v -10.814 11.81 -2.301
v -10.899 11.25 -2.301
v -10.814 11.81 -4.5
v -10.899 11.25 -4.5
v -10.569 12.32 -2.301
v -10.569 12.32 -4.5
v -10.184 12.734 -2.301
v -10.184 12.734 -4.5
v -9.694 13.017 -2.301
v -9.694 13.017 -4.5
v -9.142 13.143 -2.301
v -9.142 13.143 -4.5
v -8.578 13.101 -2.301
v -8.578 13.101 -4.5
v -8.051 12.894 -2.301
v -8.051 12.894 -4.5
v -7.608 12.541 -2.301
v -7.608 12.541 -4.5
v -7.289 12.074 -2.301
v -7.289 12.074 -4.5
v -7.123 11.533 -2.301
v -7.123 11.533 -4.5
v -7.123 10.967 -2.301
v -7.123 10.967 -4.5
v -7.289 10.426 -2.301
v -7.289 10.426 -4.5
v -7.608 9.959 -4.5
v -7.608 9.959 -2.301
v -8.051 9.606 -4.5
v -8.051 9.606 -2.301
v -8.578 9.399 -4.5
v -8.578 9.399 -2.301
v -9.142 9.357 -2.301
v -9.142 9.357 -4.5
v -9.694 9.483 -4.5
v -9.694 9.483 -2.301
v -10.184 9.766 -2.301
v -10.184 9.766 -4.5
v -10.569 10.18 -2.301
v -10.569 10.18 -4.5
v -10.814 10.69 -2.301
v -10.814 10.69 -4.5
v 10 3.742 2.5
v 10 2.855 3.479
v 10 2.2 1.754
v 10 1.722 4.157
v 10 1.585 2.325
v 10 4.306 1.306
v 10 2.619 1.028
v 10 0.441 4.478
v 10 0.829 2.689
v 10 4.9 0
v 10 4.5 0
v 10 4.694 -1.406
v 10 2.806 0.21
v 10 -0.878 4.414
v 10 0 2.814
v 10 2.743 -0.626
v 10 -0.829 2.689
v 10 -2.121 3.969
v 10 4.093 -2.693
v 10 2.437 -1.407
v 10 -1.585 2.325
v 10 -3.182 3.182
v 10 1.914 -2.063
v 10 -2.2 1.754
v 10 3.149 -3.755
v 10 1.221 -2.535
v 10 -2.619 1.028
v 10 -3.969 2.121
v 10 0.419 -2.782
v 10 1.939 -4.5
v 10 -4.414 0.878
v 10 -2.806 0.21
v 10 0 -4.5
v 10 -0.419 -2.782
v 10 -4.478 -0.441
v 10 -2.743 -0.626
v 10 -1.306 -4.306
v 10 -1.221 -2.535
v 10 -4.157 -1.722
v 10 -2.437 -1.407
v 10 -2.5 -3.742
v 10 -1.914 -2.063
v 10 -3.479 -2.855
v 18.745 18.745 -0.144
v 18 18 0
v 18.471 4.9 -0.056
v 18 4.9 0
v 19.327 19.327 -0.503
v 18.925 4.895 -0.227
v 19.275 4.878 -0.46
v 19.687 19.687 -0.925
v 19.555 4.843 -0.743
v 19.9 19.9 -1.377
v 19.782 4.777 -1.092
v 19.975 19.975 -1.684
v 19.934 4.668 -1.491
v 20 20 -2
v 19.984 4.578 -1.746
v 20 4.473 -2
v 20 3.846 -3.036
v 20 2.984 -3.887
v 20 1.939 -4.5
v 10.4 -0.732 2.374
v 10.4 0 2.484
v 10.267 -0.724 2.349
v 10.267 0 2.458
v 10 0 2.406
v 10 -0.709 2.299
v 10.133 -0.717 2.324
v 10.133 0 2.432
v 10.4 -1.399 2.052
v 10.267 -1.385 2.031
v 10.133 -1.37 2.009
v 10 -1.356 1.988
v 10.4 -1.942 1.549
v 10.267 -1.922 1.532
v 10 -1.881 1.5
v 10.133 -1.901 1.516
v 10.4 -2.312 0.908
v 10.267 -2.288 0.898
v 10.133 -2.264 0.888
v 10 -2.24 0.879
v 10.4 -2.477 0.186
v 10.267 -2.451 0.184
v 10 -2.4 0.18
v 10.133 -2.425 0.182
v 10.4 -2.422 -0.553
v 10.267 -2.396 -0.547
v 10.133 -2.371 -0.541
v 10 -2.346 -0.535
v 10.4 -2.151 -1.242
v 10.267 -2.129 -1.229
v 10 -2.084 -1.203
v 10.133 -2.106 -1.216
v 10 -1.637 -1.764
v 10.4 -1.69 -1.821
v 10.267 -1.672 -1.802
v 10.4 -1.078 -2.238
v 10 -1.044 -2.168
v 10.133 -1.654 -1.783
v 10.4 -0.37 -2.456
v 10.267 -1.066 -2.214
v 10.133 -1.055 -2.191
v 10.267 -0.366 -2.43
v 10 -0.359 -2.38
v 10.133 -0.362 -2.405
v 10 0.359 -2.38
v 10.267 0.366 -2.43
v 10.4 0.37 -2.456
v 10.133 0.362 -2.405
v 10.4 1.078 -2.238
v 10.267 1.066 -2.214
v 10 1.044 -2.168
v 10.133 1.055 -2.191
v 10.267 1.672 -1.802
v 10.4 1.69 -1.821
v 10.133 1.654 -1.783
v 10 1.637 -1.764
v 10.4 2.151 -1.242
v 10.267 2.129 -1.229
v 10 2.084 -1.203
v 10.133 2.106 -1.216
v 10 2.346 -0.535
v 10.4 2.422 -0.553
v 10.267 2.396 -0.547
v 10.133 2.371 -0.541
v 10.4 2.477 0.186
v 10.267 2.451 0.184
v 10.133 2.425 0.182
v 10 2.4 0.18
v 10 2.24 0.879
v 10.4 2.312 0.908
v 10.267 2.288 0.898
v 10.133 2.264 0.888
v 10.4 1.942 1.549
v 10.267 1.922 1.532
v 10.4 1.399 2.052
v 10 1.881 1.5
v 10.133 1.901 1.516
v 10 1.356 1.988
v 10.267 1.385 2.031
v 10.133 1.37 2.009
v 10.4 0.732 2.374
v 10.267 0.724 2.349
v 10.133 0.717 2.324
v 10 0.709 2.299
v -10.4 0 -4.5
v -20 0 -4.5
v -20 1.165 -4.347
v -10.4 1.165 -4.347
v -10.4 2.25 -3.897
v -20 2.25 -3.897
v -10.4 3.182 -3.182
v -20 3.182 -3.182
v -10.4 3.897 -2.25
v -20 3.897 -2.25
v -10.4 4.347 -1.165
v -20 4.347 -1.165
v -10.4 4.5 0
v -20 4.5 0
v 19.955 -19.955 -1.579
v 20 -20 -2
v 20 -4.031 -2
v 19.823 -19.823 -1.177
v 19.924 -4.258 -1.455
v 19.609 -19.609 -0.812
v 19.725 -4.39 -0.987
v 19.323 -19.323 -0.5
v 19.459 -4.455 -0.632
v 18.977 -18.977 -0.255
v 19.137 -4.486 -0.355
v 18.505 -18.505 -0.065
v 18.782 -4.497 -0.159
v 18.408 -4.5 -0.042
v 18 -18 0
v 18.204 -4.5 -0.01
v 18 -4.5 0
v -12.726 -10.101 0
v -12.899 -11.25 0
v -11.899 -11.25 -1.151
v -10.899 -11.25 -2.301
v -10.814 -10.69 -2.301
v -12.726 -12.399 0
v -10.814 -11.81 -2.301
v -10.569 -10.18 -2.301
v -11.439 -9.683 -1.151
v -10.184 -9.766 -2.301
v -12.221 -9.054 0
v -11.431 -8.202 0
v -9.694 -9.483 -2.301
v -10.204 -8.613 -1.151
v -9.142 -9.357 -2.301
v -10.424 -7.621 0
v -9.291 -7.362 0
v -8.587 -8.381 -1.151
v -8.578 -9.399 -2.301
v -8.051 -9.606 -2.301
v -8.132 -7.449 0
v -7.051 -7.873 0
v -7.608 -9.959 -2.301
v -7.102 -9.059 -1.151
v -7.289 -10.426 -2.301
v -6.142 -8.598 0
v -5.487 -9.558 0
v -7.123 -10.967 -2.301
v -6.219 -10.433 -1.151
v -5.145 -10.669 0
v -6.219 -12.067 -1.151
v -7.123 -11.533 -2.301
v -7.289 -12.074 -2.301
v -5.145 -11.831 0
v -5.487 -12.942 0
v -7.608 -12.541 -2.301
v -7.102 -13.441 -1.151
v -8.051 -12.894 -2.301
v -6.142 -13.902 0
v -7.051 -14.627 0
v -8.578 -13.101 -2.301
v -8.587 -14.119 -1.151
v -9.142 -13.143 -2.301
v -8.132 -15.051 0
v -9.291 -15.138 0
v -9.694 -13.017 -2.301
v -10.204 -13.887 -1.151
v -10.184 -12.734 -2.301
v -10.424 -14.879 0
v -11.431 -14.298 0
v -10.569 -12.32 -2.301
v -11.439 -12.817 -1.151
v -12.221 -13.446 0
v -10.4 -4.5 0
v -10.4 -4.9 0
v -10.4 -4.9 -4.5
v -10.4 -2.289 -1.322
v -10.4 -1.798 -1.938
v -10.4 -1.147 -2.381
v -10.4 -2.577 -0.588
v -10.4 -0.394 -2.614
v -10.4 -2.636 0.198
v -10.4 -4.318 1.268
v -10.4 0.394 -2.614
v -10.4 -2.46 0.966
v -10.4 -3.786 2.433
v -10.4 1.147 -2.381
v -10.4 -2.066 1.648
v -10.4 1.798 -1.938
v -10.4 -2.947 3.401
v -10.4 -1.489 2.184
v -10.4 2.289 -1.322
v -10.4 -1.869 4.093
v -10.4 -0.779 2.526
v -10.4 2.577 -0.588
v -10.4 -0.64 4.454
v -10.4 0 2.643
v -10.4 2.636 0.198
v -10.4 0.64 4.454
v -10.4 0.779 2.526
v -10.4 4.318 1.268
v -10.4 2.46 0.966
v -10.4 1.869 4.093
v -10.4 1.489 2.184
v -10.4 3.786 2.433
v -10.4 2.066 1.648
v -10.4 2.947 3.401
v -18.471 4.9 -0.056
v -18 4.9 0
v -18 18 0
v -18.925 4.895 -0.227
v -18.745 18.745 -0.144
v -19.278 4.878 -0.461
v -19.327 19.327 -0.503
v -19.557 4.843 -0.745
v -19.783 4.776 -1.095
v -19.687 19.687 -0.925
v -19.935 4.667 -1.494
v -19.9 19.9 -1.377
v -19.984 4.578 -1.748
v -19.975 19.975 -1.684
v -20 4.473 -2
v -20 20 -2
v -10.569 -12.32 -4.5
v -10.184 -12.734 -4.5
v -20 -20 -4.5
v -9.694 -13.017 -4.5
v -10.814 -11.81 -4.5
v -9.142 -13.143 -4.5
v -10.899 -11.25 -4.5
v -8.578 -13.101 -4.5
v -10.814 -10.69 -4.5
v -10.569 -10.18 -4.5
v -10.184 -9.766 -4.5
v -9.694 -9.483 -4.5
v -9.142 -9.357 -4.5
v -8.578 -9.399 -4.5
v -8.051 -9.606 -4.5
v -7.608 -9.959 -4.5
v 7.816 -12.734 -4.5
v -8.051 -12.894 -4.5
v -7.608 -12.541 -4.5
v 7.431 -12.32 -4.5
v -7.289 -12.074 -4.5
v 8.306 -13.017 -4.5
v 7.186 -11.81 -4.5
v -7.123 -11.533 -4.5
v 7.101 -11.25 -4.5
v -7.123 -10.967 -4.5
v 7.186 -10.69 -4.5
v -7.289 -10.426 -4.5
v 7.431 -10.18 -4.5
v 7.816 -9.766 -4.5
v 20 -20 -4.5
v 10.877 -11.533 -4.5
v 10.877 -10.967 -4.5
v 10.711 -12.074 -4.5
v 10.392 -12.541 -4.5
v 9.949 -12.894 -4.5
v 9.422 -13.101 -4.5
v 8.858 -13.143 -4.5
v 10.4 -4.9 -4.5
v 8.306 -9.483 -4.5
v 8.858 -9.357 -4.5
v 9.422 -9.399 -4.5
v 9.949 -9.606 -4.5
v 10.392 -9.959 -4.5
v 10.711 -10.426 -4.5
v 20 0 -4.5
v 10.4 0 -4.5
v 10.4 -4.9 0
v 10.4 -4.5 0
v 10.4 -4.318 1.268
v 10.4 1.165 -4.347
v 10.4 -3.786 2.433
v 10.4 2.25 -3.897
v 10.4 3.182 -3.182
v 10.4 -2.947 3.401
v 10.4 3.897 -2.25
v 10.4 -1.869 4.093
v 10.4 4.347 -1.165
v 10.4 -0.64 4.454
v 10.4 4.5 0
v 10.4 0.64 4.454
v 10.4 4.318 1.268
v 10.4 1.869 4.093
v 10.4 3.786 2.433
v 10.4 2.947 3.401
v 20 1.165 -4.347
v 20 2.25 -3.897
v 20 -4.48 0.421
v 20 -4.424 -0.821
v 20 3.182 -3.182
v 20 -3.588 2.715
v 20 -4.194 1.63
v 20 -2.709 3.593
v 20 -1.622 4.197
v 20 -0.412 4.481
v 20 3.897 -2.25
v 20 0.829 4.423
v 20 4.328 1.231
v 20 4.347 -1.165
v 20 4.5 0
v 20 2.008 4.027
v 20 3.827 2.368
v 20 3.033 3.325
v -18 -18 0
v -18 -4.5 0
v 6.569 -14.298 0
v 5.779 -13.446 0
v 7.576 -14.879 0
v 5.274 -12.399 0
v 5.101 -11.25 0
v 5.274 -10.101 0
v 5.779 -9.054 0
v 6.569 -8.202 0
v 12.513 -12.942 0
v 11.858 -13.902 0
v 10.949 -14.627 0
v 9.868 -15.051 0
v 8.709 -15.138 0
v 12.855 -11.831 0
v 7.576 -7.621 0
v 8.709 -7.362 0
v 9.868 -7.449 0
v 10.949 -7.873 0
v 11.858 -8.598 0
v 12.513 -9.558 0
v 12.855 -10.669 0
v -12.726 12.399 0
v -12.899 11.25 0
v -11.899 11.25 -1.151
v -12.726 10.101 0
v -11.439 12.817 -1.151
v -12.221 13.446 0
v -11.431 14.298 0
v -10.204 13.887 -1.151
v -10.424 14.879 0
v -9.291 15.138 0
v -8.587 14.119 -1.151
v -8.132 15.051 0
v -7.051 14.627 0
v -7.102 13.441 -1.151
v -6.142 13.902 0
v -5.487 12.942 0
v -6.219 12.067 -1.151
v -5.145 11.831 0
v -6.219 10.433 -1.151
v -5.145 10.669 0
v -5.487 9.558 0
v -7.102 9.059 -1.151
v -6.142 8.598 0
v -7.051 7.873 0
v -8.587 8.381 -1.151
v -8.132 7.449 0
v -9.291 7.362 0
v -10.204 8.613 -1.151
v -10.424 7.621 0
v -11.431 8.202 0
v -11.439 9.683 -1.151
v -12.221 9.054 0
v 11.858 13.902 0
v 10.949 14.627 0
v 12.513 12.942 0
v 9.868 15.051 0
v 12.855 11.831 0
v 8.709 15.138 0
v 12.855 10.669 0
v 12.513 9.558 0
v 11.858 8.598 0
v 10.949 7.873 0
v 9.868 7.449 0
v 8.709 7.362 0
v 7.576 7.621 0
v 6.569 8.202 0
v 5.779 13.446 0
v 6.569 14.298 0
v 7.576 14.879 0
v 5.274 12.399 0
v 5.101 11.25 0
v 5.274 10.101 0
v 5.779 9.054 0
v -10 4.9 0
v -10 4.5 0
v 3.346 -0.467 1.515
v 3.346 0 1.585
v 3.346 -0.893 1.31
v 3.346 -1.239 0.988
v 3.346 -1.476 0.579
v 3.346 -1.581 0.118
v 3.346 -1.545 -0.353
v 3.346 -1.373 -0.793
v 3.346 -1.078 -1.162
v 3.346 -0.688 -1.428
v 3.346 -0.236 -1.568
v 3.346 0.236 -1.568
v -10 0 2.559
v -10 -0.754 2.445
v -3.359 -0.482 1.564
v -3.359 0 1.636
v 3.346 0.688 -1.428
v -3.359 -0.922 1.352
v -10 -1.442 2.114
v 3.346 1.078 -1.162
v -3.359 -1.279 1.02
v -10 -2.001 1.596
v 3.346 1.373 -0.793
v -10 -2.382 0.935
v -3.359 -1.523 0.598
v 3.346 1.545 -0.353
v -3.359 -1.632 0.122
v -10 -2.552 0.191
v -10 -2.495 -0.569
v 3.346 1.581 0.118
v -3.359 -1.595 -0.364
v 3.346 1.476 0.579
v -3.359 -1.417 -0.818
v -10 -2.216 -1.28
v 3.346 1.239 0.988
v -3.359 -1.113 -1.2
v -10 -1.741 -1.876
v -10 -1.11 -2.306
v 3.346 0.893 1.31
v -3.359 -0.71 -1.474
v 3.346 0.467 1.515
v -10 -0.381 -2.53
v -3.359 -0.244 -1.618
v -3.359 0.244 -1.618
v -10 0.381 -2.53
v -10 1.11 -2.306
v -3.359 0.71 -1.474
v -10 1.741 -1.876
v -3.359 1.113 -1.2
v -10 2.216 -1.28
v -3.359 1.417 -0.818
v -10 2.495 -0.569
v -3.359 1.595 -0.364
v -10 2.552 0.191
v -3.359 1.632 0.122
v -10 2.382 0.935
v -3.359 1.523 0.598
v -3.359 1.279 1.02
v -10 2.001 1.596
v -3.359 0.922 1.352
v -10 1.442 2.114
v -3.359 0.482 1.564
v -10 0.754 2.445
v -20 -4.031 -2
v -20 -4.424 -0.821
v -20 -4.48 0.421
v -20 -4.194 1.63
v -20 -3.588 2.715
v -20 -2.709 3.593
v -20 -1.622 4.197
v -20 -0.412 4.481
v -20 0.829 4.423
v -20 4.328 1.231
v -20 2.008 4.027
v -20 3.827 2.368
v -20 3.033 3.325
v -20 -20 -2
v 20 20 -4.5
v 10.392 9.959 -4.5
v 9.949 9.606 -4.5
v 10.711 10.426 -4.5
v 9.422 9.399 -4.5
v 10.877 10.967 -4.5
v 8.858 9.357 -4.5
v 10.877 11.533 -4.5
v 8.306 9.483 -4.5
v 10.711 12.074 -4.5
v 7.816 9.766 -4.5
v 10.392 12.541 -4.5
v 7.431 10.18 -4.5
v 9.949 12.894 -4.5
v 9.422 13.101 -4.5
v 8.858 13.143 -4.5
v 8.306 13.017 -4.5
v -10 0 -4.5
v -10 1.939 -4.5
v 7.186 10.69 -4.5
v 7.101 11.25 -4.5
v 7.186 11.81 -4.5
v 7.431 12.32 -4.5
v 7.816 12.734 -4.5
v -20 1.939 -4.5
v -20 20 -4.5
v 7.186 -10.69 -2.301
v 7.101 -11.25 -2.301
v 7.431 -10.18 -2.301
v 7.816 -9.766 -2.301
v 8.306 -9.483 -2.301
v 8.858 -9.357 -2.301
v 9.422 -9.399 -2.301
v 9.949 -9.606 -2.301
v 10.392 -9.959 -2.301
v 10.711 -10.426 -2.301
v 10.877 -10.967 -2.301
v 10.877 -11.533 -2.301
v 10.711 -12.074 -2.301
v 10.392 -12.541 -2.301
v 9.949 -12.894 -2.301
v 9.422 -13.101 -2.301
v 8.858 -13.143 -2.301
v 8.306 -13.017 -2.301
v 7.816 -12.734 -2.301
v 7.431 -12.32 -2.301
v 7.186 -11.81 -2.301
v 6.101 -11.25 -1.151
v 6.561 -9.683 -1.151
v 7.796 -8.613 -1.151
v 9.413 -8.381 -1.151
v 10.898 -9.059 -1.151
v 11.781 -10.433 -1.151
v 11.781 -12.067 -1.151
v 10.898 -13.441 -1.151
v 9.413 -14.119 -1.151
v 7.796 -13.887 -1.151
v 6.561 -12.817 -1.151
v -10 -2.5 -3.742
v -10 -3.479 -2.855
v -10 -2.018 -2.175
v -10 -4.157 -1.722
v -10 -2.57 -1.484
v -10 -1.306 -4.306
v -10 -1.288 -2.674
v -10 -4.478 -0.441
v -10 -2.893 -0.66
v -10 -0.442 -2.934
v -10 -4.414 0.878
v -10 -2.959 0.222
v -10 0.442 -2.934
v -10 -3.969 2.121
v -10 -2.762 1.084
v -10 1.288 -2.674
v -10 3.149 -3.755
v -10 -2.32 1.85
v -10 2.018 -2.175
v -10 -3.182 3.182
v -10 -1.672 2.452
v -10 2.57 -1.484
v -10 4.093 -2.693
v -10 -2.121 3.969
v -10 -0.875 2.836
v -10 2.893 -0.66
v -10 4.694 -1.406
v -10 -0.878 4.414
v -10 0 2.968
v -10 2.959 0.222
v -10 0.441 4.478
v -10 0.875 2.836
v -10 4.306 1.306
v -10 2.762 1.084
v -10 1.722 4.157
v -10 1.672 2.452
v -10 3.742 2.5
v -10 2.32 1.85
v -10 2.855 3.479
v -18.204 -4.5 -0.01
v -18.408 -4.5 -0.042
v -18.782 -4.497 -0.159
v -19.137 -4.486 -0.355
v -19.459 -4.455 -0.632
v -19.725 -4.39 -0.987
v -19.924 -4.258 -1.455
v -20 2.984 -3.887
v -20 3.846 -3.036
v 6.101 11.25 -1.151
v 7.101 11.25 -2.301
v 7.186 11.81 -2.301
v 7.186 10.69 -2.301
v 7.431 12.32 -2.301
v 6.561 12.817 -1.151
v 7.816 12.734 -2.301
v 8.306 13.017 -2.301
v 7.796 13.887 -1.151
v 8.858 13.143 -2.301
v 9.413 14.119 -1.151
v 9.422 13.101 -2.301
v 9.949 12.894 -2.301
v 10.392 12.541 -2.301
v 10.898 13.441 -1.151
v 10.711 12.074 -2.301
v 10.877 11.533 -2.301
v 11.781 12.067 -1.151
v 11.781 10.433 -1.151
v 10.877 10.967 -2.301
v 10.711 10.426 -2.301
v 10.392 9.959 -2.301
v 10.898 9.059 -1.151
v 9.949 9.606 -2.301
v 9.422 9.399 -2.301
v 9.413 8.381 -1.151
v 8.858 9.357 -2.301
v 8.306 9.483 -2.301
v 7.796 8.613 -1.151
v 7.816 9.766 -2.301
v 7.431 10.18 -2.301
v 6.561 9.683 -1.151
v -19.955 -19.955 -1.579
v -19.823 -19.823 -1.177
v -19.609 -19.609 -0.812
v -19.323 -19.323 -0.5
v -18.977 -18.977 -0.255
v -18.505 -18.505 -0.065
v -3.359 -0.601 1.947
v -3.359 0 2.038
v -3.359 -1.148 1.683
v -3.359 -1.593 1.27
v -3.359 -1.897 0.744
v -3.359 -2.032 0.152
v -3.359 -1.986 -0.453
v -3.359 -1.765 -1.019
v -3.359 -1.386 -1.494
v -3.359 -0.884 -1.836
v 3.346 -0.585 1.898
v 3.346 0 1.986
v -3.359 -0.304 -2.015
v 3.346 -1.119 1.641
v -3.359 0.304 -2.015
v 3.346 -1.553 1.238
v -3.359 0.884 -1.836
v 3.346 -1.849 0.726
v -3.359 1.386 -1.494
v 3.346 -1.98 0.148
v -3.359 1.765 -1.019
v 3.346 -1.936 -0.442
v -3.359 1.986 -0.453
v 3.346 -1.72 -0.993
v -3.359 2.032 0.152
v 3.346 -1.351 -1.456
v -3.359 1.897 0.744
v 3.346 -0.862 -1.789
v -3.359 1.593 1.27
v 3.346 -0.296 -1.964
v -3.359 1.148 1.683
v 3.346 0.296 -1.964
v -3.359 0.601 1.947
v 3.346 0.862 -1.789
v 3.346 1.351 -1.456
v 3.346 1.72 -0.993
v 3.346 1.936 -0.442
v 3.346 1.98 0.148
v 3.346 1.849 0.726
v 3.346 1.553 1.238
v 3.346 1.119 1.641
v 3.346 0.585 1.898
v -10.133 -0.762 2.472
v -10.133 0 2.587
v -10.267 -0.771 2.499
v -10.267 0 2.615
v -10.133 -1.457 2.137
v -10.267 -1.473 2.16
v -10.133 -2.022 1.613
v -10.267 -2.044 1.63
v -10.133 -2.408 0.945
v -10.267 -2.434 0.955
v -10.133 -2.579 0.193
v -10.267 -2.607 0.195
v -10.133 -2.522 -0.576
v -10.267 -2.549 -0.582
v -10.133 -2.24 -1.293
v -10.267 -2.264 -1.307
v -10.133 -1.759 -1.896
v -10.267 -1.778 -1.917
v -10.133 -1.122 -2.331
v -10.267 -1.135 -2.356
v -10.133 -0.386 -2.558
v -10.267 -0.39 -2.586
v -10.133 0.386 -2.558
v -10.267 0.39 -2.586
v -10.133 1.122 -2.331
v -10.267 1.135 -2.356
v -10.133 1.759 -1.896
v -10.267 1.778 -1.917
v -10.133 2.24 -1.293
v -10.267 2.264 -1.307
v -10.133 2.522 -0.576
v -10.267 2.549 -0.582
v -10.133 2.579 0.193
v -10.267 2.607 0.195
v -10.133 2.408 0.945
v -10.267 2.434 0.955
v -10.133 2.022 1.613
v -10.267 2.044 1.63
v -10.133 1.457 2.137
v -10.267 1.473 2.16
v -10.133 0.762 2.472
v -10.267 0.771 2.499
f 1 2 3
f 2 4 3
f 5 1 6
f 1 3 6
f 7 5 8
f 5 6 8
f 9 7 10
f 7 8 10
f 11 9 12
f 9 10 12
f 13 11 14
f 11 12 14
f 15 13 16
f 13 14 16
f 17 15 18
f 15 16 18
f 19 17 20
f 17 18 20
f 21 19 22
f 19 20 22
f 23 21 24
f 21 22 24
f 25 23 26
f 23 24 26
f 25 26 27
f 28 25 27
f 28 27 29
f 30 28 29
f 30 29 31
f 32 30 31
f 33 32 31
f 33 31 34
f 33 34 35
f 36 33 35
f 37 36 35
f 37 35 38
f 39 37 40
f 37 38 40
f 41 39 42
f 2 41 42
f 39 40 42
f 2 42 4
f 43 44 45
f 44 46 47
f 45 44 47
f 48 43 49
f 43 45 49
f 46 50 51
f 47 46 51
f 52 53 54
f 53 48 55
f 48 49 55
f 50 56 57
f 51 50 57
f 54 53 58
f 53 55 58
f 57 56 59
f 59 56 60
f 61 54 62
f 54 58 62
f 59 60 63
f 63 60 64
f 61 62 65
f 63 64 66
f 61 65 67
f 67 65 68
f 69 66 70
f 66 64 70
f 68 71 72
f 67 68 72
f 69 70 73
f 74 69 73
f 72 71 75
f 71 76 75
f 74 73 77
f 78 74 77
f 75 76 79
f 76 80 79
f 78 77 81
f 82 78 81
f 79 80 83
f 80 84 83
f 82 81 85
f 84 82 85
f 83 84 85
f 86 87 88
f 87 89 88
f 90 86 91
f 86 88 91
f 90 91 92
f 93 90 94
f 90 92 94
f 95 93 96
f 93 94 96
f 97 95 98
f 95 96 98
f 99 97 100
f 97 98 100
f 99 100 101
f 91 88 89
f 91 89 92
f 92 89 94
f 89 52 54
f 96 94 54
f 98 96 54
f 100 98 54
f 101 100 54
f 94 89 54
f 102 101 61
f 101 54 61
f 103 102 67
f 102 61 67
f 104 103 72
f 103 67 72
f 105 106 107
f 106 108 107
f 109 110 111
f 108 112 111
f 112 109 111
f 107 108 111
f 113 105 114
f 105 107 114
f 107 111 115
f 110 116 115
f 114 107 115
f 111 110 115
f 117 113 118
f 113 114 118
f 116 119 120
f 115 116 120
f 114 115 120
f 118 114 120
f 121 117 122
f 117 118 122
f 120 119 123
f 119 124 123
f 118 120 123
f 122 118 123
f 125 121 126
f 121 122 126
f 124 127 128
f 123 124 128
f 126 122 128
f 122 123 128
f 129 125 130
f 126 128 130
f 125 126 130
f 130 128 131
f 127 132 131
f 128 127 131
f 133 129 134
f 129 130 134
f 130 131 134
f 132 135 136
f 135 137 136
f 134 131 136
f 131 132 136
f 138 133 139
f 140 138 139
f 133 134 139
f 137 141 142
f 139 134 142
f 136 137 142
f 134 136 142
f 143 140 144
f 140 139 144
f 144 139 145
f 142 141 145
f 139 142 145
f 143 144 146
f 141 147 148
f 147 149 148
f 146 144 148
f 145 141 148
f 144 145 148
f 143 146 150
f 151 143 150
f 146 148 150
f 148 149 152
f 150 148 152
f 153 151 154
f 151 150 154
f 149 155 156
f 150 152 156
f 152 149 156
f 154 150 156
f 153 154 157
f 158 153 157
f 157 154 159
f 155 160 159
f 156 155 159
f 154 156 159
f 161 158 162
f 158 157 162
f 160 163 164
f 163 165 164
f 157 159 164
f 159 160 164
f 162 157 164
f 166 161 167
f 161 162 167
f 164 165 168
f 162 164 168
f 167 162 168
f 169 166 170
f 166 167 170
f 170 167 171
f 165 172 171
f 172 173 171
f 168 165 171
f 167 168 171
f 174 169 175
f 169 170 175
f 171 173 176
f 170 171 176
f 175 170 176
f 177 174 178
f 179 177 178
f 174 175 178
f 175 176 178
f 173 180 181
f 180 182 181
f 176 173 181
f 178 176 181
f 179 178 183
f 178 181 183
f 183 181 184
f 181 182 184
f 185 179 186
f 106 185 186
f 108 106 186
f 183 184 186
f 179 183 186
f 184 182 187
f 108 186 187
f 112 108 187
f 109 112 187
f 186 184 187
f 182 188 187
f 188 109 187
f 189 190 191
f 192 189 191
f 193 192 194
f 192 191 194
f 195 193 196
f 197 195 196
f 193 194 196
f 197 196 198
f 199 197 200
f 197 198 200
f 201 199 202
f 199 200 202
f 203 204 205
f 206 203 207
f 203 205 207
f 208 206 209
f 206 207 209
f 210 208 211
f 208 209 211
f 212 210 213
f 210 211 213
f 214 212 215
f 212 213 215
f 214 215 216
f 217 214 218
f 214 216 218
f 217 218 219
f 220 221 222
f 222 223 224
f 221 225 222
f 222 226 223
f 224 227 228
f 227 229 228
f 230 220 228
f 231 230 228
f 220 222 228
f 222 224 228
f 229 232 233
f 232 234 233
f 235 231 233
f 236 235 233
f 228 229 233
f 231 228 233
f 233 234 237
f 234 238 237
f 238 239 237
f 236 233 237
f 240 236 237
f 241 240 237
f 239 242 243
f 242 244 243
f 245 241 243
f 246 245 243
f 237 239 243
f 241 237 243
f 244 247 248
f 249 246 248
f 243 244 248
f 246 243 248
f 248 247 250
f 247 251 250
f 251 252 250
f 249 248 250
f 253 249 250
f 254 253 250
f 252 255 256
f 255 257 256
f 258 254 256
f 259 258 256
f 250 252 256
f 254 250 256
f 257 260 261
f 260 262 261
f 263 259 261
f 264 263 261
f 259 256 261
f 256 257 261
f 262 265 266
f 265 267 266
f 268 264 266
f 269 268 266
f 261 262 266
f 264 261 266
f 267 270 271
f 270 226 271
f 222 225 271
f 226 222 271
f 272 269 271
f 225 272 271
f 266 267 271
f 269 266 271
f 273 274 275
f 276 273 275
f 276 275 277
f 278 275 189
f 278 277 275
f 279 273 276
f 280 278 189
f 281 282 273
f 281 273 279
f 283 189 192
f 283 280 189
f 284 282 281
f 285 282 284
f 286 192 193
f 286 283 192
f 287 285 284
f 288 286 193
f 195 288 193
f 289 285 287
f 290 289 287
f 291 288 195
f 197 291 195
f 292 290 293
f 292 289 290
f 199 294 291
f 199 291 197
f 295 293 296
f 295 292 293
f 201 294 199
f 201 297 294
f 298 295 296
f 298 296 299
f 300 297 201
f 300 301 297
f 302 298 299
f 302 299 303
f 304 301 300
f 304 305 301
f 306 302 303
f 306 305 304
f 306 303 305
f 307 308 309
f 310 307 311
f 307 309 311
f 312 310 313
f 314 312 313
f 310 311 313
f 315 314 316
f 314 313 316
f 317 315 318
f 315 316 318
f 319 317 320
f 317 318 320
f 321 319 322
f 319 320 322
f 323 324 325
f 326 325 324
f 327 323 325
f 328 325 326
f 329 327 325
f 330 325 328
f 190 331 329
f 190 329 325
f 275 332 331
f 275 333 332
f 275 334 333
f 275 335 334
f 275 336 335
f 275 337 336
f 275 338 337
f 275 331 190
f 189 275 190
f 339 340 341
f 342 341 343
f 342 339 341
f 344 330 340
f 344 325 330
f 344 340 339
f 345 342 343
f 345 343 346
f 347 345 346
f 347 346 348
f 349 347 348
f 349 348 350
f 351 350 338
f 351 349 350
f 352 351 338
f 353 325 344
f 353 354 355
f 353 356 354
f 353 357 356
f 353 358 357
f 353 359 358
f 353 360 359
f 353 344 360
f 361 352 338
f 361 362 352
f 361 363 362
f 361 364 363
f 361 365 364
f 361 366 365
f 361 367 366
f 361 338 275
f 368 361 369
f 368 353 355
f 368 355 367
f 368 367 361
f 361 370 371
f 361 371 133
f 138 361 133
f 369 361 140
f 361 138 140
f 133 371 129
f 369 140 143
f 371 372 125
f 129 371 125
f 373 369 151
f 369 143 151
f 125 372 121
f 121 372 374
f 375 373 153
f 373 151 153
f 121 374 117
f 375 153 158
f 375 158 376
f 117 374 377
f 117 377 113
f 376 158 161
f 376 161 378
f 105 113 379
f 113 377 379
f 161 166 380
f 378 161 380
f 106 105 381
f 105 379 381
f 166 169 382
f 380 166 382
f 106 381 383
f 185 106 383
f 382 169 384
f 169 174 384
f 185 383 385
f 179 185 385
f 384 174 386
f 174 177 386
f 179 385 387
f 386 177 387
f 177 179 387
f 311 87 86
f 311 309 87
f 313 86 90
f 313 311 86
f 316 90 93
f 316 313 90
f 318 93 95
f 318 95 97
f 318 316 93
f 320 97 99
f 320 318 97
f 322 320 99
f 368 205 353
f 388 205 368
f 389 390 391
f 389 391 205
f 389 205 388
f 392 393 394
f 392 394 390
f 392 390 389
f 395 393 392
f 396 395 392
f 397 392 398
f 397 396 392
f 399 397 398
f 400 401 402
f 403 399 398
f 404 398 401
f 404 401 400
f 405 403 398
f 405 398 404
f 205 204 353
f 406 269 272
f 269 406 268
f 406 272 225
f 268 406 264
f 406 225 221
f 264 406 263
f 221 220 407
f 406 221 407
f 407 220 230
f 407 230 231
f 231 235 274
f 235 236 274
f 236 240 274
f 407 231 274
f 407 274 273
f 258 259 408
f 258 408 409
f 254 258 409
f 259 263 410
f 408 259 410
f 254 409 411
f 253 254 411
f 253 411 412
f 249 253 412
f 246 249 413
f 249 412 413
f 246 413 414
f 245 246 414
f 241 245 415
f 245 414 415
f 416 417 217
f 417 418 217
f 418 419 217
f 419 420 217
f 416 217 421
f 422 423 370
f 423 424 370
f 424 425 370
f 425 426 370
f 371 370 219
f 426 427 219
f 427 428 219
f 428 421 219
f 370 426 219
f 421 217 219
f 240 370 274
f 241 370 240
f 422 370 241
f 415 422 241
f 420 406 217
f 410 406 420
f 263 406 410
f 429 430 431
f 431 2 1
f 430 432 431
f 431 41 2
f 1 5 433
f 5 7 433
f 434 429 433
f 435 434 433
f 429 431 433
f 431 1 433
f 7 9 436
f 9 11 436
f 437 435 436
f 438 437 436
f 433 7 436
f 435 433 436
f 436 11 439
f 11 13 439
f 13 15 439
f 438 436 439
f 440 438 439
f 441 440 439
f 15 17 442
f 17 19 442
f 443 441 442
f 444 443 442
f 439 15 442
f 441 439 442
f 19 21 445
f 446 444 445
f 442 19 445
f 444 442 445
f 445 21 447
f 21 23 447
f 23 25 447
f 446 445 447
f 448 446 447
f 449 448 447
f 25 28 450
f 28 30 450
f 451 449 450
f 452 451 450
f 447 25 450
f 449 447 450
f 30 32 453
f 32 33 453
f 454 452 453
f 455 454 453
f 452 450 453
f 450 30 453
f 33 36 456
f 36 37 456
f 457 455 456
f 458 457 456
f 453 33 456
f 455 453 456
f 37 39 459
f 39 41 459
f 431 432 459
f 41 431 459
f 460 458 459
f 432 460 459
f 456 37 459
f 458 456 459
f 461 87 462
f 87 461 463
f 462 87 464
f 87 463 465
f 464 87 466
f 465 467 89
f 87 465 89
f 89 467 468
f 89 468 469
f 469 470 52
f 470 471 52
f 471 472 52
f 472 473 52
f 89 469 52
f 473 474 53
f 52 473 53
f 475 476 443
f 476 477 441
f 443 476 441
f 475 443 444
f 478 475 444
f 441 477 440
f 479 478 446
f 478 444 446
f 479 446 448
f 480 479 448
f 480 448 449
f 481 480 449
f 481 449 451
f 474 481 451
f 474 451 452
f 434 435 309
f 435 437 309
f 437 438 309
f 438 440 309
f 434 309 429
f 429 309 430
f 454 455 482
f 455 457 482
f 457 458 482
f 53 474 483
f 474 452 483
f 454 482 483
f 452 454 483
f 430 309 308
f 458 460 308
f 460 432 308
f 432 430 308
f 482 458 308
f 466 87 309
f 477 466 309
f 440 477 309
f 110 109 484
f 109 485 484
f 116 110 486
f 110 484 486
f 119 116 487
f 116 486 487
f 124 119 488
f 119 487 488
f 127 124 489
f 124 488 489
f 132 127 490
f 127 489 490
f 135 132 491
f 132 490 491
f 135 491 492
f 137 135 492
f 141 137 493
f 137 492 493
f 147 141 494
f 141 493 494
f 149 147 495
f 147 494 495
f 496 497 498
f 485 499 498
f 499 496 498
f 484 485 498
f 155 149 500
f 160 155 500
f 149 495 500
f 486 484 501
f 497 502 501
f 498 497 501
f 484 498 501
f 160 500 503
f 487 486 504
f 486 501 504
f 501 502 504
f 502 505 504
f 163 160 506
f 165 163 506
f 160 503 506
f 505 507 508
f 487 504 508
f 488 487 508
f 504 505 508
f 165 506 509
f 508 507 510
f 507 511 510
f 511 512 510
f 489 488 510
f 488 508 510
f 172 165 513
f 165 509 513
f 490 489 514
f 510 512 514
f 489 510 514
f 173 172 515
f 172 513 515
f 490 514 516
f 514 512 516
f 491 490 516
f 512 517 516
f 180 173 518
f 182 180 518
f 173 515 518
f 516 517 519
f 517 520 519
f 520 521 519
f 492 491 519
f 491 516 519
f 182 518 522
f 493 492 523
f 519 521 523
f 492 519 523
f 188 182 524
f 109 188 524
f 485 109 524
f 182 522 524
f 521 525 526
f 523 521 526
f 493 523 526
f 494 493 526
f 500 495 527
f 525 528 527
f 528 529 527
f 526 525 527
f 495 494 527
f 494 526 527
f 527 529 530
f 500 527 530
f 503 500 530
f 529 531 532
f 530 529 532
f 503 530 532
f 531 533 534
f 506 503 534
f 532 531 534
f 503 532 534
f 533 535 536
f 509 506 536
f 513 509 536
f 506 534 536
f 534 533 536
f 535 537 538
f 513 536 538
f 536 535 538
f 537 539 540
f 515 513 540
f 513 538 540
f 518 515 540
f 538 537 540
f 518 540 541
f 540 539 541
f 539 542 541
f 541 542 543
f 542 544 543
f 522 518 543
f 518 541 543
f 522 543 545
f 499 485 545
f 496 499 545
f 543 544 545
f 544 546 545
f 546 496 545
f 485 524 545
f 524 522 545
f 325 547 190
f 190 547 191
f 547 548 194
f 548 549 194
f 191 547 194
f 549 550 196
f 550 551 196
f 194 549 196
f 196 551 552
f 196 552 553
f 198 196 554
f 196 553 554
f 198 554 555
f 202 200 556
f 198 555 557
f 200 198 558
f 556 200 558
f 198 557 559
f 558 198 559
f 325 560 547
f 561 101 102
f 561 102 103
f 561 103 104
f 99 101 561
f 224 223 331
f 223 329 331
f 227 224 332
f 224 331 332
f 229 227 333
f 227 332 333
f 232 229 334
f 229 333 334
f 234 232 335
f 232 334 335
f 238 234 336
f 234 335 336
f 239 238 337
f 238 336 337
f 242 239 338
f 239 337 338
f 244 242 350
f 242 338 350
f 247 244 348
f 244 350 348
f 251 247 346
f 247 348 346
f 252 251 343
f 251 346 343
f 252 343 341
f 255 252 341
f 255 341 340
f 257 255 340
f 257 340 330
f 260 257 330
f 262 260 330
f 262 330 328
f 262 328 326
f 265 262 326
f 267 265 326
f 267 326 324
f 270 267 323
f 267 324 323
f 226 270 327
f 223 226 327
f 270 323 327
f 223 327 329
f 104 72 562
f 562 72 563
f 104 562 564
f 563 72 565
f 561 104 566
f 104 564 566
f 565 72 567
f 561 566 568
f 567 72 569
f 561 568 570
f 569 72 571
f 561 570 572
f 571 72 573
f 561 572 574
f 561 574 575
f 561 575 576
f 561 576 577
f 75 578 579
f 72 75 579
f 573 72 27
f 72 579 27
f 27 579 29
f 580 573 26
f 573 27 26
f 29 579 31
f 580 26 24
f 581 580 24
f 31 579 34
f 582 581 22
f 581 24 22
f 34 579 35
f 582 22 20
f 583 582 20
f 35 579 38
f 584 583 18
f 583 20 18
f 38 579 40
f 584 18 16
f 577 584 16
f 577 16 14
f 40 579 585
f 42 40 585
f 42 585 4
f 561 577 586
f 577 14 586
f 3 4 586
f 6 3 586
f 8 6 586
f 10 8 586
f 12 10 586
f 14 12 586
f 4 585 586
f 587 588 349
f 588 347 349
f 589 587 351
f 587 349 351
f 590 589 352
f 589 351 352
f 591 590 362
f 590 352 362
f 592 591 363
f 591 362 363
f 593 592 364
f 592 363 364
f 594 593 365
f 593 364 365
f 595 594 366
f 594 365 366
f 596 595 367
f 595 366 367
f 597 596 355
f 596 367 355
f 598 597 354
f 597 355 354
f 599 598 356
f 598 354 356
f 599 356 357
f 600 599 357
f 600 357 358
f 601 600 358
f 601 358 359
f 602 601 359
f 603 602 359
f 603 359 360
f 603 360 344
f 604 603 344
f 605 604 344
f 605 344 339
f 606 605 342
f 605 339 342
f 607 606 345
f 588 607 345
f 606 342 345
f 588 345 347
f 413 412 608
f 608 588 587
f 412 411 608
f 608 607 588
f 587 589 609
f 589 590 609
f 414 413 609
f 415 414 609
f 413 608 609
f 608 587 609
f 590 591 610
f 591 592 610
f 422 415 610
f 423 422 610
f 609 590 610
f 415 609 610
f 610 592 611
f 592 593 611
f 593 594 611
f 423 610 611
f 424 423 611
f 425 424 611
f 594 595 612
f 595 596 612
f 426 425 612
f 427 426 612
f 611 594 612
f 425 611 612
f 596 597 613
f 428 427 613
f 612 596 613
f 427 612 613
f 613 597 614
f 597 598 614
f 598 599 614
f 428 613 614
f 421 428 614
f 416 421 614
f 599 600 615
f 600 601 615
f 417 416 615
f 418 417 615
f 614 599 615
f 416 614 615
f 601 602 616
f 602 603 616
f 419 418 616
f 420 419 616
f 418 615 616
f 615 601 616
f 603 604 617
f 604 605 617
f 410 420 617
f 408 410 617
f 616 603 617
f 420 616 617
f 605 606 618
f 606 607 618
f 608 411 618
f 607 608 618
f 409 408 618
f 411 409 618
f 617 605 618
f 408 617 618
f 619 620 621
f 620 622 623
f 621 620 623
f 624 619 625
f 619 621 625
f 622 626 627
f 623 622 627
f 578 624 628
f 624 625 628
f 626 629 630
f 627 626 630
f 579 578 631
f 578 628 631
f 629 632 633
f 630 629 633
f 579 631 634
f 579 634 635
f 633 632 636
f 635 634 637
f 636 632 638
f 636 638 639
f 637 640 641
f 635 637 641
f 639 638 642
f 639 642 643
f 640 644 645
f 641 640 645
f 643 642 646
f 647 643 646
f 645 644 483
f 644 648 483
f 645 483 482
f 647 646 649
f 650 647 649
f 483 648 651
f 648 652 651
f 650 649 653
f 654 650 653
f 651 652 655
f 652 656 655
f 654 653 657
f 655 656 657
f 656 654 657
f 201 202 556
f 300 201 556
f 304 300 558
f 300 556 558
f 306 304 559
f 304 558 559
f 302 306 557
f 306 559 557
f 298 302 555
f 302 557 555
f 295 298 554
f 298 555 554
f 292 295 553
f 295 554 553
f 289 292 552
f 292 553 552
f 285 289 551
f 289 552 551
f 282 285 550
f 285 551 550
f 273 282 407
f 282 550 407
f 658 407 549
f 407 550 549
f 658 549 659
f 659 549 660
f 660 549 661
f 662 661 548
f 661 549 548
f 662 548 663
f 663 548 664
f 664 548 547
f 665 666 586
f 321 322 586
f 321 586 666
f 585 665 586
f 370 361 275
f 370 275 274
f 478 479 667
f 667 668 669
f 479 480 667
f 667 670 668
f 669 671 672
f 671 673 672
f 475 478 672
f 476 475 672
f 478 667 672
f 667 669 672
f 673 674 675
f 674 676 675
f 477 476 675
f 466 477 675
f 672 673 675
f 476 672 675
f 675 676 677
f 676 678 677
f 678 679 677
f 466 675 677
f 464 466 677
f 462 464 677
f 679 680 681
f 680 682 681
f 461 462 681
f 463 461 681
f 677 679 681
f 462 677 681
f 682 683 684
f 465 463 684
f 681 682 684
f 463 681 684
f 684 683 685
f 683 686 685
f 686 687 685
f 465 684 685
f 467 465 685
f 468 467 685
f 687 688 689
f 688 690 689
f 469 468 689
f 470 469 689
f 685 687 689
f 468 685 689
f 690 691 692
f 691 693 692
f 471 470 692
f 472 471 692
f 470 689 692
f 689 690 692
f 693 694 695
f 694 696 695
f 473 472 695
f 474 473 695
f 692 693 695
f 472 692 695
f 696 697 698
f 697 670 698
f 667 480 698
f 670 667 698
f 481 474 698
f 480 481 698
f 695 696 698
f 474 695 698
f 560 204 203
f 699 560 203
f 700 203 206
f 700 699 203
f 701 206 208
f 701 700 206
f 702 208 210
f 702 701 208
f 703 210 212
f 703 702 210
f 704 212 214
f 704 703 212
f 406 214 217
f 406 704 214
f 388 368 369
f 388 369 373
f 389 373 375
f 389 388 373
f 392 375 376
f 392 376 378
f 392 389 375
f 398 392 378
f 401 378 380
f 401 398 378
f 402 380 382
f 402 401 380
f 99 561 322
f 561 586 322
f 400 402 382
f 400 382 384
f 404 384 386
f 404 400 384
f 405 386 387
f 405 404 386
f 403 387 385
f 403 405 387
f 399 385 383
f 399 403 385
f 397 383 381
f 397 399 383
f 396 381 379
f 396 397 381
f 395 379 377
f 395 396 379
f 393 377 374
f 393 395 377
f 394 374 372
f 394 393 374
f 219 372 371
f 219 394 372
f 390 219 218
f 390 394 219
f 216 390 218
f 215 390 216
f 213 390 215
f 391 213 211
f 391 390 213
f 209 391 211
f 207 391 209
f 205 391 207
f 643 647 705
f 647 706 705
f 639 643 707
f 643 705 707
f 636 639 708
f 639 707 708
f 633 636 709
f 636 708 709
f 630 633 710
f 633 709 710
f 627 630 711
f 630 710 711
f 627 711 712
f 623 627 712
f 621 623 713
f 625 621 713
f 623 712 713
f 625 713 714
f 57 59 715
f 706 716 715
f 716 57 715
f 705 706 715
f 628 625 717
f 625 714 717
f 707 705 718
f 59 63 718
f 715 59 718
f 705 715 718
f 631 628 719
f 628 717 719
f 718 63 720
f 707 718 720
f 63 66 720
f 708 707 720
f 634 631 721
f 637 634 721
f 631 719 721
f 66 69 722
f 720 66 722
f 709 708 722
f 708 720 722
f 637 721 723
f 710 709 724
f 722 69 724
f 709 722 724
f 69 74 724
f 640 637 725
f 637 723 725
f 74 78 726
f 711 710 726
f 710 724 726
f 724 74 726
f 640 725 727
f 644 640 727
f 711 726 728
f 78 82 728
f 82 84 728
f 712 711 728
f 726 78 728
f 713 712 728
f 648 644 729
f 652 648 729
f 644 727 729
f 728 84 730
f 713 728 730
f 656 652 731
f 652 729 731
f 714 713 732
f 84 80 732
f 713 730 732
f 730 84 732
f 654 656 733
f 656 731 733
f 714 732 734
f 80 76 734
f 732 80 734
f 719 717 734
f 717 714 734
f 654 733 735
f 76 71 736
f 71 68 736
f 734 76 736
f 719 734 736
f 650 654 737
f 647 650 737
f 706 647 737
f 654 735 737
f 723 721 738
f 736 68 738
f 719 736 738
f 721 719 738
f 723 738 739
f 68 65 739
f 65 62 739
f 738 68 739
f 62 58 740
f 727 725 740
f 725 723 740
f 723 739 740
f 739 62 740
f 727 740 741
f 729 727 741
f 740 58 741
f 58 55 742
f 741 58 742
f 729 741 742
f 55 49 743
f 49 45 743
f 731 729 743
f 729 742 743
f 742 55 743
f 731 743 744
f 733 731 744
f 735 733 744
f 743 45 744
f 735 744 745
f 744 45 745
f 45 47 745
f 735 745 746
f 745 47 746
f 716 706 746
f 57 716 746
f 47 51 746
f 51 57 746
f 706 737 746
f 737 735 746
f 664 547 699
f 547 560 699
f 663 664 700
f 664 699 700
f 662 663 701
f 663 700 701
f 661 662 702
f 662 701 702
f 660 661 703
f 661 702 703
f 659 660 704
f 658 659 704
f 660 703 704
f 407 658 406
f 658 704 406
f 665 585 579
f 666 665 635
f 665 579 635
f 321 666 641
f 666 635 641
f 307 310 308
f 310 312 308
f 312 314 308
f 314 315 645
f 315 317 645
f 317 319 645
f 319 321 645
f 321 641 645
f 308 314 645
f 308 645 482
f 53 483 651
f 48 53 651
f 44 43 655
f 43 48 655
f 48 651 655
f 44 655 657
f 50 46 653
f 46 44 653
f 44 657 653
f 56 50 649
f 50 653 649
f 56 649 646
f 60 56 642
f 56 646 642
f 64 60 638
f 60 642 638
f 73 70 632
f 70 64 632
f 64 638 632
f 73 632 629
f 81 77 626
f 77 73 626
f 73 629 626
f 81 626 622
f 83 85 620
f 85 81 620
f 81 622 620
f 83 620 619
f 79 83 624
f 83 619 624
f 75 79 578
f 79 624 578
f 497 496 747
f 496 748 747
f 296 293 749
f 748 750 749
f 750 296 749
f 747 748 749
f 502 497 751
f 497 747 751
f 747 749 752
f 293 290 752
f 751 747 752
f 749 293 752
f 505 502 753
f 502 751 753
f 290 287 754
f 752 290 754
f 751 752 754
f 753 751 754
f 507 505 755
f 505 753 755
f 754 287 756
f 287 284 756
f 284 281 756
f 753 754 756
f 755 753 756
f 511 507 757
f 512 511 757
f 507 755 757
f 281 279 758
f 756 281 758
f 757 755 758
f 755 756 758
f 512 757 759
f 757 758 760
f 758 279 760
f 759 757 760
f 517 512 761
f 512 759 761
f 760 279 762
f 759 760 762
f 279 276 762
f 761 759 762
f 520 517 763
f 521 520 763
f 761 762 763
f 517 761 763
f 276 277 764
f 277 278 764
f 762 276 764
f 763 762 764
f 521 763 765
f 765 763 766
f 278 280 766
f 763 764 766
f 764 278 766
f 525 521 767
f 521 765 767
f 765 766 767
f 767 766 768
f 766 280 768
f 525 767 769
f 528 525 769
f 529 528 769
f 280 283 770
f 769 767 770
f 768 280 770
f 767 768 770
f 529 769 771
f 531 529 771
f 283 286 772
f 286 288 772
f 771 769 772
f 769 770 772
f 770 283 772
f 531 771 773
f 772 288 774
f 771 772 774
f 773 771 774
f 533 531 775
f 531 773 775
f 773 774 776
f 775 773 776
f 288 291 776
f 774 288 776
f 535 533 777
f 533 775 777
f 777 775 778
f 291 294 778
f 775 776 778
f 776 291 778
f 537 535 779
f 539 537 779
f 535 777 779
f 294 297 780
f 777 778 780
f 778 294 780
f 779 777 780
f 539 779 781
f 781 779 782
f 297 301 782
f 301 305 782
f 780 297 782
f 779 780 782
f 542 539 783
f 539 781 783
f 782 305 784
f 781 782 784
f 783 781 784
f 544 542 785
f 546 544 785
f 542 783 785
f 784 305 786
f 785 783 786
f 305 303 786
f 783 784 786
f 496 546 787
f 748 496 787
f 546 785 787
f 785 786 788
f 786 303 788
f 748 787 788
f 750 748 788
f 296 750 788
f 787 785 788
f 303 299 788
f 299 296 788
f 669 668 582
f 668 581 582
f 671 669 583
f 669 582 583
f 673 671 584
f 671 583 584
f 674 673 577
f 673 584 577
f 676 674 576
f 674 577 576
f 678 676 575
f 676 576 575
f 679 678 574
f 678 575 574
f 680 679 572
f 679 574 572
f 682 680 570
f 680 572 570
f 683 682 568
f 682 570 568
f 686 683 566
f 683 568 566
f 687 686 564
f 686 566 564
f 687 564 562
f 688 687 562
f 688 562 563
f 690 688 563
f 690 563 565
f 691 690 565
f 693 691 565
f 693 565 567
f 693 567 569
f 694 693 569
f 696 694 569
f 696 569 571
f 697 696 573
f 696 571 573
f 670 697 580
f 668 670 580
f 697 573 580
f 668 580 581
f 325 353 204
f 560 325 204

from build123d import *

# Parameters (mm, degrees)
F5_W              = 15.5
F5_H              = 4.5
F8_DEPTH          = 10
F8_DEPTH_BACK     = 10
F9_W              = 0.4
F9_H              = 4.5
F10_DEPTH         = 9.6
F12_DEPTH         = 9.6
F13_DEPTH         = 9.6
F11_W             = 0.4
F11_H             = 4.5
F14_DEPTH         = 9.6
F9_W_2            = 15.1
F15_DEPTH         = 40
F17_DEPTH         = 10
F19_DEPTH         = 10
F20_R             = 2
F20_2_R           = 2
F22_D             = 3.7973
F22_CSINK_D       = 7.7978
F22_CSINK_ANGLE   = 82
F22_2_D           = 3.7973
F22_2_CSINK_D     = 7.7978
F22_2_CSINK_ANGLE = 82


with BuildPart() as f3:
    # F2 (on Front) → F3 (revolve)
    with BuildSketch(Plane.XZ):
        with BuildLine():
            Line((-10, 2.5590475353), (-10, 0))
            Line((-10, 0), (10, 0))
            Line((10, 0), (10, 2.4063855079))
            ThreePointArc((10, 2.4063855079), (-0.0074897347, 1.5014987586), (-10, 2.5590475353))
        make_face()
        with BuildLine():
            Line((-10.4, 0), (-10, 0))
            Line((-10, 0), (-10, 2.5590475353))
            ThreePointArc((-10, 2.5590475353), (-10.2000835145, 2.6006984263), (-10.4, 2.6431437831))
            Line((-10.4, 2.6431437831), (-10.4, 0))
        make_face()
        with BuildLine():
            Line((10, 2.4063855079), (10, 0))
            Line((10, 0), (10.4, 0))
            Line((10.4, 0), (10.4, 2.484120304))
            ThreePointArc((10.4, 2.484120304), (10.2000769588, 2.4448568988), (10, 2.4063855079))
        make_face()
    revolve(axis=Axis((0, 0, 0), (1, 0, 0)))

    # F9 (on offset) → F10 (join, through all)
    with BuildSketch(Plane.YZ.offset(20)):
        with Locations((-4.7, -2.25)):
            Rectangle(F9_W, F9_H)
        with BuildLine():
            ThreePointArc((4.5, 0), (0, 4.5), (-4.5, 0))
            Line((-4.5, 0), (4.5, 0))
        make_face()
        with BuildLine():
            ThreePointArc((0, -4.5), (-3.1819805153, -3.1819805153), (-4.5, 0))
            Line((-4.5, 0), (-4.5, -4.5))
            Line((-4.5, -4.5), (0, -4.5))
        make_face()
        with BuildLine():
            Line((4.5, 0), (-4.5, 0))
            ThreePointArc((-4.5, 0), (-3.1819805153, -3.1819805153), (0, -4.5))
            ThreePointArc((0, -4.5), (3.1819805153, -3.1819805153), (4.5, 0))
        make_face()
    extrude(amount=-F10_DEPTH)

    # F11 (on offset) → F12 (join, through all)
    with BuildSketch(Plane.YZ.offset(-20)):
        with BuildLine():
            ThreePointArc((0, -4.5), (3.1819805153, -3.1819805153), (4.5, 0))
            Line((4.5, 0), (-4.5, 0))
            ThreePointArc((-4.5, 0), (-3.1819805153, -3.1819805153), (0, -4.5))
        make_face()
        with BuildLine():
            Line((-4.5, 0), (4.5, 0))
            ThreePointArc((4.5, 0), (0, 4.5), (-4.5, 0))
        make_face()
        with BuildLine():
            ThreePointArc((0, -4.5), (-3.1819805153, -3.1819805153), (-4.5, 0))
            Line((-4.5, 0), (-4.5, -4.5))
            Line((-4.5, -4.5), (0, -4.5))
        make_face()
    extrude(amount=F12_DEPTH)

    # F9 (on offset) → F13 (join)
    with BuildSketch(Plane.YZ.offset(20)):
        with Locations((-4.7, -2.25)):
            Rectangle(F9_W, F9_H)
    extrude(amount=-F13_DEPTH)

    # F11 (on offset) → F14 (join)
    with BuildSketch(Plane.YZ.offset(-20)):
        with Locations((-4.7, -2.25)):
            Rectangle(F11_W, F11_H)
    extrude(amount=F14_DEPTH)

    # F9 (on offset) → F15 (join, through all)
    with BuildSketch(Plane.YZ.offset(20)):
        with Locations((-12.45, -2.25)):
            Rectangle(F9_W_2, F9_H)
    extrude(amount=-F15_DEPTH)

    # F20
    f20_edges = [f3.edges().sort_by_distance(p)[0] for p in [
        (20, -12.25, 0),
        (0, -20, 0),
        (-20, -12.25, 0),
    ]]
    fillet(f20_edges, radius=F20_R)

    # F22 (through all)
    with Locations(Plane.XY):
        with Locations((9, 11.25), (-9, 11.25), (-9, -11.25), (9, -11.25)):
            CounterSinkHole(F22_D / 2, F22_CSINK_D / 2, counter_sink_angle=F22_CSINK_ANGLE)


with BuildPart() as f4:
    # F2 (on Front) → F4 (revolve)
    with BuildSketch(Plane.XZ):
        with BuildLine():
            Line((-10, 4.5), (-10, 2.9675223036))
            ThreePointArc((-10, 2.9675223036), (-0.0076110898, 1.9015114363), (10, 2.8136164617))
            Line((10, 2.8136164617), (10, 4.5))
            Line((10, 4.5), (-10, 4.5))
        make_face()
    revolve(axis=Axis((0, 0, 0), (1, 0, 0)))

    # F5 (on Right) → F8 (join, two sides)
    with BuildSketch(Plane.YZ) as f8_sk:
        with Locations((12.25, -2.25)):
            Rectangle(F5_W, F5_H)
        with BuildLine():
            Line((4.5, -4.5), (4.5, 0))
            ThreePointArc((4.5, 0), (3.1819805153, -3.1819805153), (0, -4.5))
            Line((0, -4.5), (4.5, -4.5))
        make_face()
    extrude(amount=F8_DEPTH)
    extrude(f8_sk.sketch, amount=-F8_DEPTH_BACK)

    # F16 (on face) → F17 (join, through all)
    with BuildSketch(Plane(origin=(-10, 0, 0), x_dir=(0, -1, 0), z_dir=(-1, 0, 0))):
        with BuildLine():
            ThreePointArc((-1.939071943, -4.5), (-4.0933759002, -2.6933759002), (-4.9, 0))
            Line((-4.9, 0), (-20, 0))
            Line((-20, 0), (-20, -4.5))
            Line((-20, -4.5), (-1.939071943, -4.5))
        make_face()
    extrude(amount=F17_DEPTH)

    # F18 (on face) → F19 (join, through all)
    with BuildSketch(Plane.YZ.offset(10)):
        with BuildLine():
            Line((20, 0), (4.9, 0))
            ThreePointArc((4.9, 0), (4.0933759002, -2.6933759002), (1.939071943, -4.5))
            Line((1.939071943, -4.5), (20, -4.5))
            Line((20, -4.5), (20, 0))
        make_face()
    extrude(amount=F19_DEPTH)

    # F20#2
    f20_2_edges = [f4.edges().sort_by_distance(p)[0] for p in [
        (20, 12.45, 0),
        (0, 20, 0),
        (-20, 12.45, 0),
    ]]
    fillet(f20_2_edges, radius=F20_2_R)

    # F22#2 (through all)
    with Locations(Plane.XY):
        with Locations((9, 11.25), (-9, 11.25), (-9, -11.25), (9, -11.25)):
            CounterSinkHole(F22_2_D / 2, F22_2_CSINK_D / 2, counter_sink_angle=F22_2_CSINK_ANGLE)


solid = Compound([f3.part, f4.part])
